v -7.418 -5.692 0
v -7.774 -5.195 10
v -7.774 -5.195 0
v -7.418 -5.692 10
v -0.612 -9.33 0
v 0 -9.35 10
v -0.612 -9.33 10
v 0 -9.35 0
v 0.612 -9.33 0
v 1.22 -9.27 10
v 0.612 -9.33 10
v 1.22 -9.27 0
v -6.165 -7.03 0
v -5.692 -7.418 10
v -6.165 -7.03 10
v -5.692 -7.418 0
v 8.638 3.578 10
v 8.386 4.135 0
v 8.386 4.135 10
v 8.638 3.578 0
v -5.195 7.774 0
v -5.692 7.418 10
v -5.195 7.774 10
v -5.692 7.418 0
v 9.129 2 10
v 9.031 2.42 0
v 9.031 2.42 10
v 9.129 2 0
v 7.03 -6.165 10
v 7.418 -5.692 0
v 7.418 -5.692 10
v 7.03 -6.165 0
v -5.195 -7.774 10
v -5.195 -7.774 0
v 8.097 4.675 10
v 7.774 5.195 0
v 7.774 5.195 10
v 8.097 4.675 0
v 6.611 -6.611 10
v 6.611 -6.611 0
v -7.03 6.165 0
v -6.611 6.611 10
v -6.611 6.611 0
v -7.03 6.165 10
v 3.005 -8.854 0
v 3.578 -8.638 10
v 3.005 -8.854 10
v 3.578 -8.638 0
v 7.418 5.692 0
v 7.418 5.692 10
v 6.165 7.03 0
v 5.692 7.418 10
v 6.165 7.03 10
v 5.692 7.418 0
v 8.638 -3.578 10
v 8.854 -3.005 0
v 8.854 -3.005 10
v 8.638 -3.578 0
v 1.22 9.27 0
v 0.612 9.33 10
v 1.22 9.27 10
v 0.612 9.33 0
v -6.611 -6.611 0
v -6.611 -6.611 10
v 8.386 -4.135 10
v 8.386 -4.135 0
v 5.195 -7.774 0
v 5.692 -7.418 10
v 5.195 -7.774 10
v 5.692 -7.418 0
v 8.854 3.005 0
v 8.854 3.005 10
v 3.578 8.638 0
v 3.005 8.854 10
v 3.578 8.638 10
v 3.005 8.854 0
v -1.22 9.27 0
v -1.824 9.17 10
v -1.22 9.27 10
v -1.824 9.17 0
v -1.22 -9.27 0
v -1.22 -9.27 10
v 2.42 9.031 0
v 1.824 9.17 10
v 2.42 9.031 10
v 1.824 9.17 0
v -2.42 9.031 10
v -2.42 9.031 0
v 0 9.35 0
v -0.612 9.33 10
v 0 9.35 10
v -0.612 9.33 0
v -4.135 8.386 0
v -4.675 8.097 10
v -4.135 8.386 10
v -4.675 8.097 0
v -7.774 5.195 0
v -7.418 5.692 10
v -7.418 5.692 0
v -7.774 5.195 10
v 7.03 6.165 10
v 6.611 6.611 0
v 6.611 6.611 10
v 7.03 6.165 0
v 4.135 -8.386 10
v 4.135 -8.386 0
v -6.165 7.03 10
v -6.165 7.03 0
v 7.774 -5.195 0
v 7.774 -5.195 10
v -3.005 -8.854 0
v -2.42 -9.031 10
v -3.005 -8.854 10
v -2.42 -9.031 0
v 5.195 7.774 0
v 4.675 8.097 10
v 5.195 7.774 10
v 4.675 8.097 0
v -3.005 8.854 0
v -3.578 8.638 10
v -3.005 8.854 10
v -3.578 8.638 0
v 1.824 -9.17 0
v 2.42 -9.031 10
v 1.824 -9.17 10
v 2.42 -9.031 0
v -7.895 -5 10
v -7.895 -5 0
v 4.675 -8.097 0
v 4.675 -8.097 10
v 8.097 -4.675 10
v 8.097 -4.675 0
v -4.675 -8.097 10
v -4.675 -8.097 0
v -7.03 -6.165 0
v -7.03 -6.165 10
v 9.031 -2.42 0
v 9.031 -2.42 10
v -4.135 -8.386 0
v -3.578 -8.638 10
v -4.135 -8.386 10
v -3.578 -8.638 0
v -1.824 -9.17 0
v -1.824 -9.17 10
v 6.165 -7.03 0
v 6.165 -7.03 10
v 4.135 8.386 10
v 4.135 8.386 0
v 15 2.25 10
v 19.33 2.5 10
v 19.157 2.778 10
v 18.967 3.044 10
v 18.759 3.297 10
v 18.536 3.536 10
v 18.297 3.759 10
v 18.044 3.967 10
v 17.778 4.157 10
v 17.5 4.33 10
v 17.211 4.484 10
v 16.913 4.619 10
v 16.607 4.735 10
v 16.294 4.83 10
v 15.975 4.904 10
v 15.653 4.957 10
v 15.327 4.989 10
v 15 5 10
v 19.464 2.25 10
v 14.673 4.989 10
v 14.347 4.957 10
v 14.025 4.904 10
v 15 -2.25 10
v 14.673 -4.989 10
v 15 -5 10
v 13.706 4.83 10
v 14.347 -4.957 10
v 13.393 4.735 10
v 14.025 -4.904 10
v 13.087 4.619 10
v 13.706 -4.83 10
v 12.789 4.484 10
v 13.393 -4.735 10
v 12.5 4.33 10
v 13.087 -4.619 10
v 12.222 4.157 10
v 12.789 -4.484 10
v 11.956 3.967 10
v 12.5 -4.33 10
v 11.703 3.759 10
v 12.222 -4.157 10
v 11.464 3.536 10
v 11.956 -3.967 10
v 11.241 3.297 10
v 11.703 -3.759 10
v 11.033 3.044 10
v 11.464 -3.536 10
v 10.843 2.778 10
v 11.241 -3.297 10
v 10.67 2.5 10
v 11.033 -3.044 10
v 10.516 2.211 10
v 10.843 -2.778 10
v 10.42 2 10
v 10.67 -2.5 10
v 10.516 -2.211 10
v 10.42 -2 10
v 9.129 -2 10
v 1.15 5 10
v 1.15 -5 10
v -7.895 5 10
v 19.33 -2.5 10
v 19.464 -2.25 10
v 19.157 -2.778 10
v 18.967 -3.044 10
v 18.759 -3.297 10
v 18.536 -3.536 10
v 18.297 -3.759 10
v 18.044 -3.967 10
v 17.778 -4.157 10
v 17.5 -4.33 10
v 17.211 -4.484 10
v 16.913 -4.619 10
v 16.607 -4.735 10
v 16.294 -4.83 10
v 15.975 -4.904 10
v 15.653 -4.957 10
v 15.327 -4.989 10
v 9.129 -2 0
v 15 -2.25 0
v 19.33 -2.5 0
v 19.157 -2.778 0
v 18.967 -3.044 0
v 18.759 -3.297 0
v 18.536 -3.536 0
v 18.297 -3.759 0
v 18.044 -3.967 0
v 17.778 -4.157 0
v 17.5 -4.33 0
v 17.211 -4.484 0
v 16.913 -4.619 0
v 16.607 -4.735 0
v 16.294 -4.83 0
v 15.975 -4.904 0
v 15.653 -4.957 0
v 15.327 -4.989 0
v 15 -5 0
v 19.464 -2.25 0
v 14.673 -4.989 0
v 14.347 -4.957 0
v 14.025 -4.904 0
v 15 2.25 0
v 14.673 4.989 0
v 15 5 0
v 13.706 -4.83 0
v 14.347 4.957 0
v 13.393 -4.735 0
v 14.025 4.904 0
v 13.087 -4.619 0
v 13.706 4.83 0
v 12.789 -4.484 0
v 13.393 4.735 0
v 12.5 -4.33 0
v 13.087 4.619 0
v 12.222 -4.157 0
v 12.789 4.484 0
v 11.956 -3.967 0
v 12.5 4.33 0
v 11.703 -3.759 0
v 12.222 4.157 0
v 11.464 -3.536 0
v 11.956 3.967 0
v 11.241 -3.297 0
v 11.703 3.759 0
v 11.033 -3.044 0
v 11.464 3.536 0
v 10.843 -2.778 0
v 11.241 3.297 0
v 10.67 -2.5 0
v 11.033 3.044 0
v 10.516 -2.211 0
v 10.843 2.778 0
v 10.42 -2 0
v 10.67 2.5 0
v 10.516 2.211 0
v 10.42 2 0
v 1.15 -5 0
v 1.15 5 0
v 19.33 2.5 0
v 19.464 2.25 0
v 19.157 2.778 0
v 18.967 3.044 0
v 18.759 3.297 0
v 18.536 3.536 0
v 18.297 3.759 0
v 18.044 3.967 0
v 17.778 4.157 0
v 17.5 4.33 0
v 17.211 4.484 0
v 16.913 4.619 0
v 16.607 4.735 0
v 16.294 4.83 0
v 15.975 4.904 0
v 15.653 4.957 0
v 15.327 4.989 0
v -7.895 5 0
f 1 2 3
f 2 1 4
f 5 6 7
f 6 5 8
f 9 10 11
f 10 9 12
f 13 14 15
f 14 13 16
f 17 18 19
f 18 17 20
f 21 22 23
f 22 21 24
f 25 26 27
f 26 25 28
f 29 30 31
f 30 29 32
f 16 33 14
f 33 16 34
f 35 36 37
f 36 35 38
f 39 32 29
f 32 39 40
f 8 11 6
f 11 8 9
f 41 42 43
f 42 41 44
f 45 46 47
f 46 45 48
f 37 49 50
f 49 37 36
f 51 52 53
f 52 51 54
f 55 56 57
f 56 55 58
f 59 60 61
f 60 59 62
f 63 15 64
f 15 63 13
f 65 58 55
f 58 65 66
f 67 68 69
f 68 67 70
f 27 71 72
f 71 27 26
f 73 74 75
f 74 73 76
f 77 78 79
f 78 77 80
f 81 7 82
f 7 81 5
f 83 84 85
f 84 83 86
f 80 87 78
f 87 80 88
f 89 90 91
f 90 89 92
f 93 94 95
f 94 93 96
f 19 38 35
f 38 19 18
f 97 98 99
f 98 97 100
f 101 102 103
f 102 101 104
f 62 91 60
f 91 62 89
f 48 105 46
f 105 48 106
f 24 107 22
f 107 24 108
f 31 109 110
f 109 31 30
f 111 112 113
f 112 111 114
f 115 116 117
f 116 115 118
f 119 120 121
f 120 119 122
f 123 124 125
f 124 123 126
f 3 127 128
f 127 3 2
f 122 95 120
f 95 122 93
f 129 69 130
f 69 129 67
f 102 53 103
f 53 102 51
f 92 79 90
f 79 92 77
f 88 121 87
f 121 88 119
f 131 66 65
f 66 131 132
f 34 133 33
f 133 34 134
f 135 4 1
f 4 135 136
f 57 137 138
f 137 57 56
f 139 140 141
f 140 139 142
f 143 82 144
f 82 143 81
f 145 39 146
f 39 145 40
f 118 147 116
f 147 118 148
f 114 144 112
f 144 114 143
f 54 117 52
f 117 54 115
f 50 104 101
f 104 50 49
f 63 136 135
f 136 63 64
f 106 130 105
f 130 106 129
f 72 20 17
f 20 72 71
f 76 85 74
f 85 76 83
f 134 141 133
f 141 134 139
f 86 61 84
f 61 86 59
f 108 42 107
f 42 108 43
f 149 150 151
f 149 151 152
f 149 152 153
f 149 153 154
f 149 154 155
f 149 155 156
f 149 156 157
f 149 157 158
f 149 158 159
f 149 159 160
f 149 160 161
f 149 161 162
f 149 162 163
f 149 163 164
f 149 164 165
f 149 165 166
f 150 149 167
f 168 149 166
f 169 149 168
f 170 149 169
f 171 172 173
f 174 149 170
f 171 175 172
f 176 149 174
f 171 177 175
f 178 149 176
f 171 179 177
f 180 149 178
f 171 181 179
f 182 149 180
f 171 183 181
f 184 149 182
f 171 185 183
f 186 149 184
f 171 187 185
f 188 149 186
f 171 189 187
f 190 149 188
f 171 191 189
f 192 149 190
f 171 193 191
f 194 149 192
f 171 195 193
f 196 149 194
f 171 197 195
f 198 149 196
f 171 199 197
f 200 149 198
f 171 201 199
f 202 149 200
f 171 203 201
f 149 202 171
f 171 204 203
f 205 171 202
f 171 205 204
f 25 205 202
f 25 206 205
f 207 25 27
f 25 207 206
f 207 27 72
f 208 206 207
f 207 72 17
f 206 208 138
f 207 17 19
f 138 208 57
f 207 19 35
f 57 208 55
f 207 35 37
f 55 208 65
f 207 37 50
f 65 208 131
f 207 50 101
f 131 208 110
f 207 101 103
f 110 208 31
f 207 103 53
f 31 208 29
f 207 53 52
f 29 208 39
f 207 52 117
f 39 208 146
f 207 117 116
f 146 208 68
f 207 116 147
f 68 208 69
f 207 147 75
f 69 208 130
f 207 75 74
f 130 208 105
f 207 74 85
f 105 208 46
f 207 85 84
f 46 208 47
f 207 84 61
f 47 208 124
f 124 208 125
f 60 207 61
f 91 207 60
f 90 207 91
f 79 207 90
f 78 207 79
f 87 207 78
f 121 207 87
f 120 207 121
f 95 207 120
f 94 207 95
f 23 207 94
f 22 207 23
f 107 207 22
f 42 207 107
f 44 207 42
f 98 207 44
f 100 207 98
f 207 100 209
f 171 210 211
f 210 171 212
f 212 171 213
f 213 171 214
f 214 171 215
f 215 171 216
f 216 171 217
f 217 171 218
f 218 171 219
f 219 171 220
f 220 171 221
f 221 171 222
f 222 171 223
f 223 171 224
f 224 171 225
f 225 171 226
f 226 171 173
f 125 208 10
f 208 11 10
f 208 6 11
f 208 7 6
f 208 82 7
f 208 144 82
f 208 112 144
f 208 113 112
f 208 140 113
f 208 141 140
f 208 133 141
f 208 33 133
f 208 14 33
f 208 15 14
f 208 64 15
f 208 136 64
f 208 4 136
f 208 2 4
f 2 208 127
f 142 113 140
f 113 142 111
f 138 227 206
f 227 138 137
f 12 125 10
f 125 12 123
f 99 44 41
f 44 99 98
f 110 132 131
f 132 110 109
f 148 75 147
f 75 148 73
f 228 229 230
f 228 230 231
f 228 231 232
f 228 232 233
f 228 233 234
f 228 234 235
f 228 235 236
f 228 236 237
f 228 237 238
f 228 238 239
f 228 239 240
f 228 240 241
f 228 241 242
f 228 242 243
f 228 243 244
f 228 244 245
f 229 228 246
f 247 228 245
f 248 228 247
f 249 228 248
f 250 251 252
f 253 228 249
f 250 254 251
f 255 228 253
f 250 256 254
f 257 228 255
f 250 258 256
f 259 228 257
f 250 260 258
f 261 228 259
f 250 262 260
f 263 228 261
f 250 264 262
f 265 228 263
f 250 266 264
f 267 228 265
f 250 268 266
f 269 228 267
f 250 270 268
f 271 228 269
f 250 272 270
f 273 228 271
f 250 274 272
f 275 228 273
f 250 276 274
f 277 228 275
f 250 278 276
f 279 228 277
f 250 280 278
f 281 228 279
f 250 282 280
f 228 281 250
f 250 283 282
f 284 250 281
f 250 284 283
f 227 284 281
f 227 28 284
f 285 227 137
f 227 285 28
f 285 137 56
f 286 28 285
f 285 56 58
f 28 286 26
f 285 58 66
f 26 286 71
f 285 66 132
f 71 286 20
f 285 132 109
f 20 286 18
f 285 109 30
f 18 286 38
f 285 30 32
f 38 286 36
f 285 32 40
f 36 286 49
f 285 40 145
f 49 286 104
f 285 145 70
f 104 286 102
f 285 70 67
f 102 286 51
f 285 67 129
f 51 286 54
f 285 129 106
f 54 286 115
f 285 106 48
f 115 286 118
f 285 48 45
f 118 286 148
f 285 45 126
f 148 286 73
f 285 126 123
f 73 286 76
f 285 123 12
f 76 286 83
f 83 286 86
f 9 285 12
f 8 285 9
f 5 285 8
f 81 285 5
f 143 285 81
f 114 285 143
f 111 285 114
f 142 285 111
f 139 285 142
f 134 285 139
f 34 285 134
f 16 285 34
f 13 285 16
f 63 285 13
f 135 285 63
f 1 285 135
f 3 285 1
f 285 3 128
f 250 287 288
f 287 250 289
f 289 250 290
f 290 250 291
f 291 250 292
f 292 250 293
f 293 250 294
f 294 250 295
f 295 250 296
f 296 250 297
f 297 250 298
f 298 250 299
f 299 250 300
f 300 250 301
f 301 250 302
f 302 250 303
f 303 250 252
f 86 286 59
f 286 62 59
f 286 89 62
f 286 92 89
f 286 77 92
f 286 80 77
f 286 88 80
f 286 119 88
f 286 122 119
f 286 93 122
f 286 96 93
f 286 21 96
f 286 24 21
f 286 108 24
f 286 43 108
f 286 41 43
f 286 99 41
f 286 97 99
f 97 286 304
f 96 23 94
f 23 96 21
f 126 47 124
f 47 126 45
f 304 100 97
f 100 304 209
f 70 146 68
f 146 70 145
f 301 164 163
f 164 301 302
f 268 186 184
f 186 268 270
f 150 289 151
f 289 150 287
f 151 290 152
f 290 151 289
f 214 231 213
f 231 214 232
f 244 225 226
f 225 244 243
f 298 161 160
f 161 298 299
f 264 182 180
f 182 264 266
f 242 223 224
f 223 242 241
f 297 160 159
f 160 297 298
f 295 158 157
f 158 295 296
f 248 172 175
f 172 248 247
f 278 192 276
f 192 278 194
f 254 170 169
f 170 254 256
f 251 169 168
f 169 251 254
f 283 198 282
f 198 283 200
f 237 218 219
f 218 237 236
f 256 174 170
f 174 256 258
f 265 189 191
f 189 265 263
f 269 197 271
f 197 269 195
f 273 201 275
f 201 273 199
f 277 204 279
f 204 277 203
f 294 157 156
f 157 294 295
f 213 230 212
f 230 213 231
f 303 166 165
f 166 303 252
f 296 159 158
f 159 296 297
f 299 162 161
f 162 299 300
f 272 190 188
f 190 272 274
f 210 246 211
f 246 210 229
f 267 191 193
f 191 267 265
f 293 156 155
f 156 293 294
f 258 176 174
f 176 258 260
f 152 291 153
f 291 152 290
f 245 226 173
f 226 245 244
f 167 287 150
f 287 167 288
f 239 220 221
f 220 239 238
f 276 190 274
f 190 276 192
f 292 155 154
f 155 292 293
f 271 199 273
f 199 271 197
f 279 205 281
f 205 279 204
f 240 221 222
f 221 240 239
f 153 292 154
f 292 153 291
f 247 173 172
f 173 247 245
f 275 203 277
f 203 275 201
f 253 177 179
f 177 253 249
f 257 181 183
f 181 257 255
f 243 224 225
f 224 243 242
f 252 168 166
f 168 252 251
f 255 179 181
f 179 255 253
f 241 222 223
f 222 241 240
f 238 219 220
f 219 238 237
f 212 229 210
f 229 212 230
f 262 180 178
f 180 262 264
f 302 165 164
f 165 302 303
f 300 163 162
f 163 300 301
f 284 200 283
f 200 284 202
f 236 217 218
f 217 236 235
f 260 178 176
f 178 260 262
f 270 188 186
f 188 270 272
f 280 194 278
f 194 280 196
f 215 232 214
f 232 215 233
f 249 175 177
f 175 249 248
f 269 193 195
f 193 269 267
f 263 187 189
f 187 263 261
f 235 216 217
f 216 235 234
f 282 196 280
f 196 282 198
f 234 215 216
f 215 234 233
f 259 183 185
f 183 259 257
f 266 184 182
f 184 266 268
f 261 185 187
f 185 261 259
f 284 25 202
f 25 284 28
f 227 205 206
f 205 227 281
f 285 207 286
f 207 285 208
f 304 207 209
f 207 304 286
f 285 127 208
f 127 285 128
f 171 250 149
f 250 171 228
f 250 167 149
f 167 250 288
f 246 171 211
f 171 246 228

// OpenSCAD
// Tubing organiser clip for a 12.7 mm lab stand rod
// Print orientation: flat on the bed, z = 0 up to z = 10

// ---------------- Parameters ----------------
ring_d      = 12.7;   // rod ring inner diameter (stand rod)
ring_w      = 3;      // rod ring wall thickness
ring_o      = ring_d + 2 * ring_w;  // rod ring outer diameter (18.7)

tub_d       = 6;      // tubing ring inner diameter
tub_w       = 2;      // tubing ring wall thickness
tub_x       = 15;     // tubing ring centre X position
tub_o       = tub_d + 2 * tub_w;    // tubing ring outer diameter (10)

bridge_x0   = 8;      // bridge start X
bridge_x1   = 12;     // bridge end X
bridge_w    = bridge_x1 - bridge_x0;  // bridge width (6)

cut_r       = 10;     // opening width for rod ring (-X side)
cut_t       = 4.5;    // opening width for tubing ring (+X side)

eps         = 0.5;    // cutter overshoot past faces
$fn         = 96;     // curve resolution

// ---------------- Model ----------------
difference() {
    union() {
        // Rod ring, centred at origin
        cylinder(d = ring_o, h = 10);

        // Tubing ring, centred at x = 15, y = 0
        translate([tub_x, 0, 0])
            cylinder(d = tub_o, h = 10);

        // Solid bridge between x = 8 and x = 12
        translate([bridge_x0, -bridge_w / 2, 0])
            cube([bridge_w, bridge_w, 10]);
    }

    // Opening in rod ring: x < 0 and -5 < y < 5
    translate([-ring_o / 2 - eps, -5, 0])
        cube([cut_r + 2 * eps, 10, 10 + eps]);

    // Opening in tubing ring: x > 15 and -2.25 < y < 2.25
    translate([tub_x, -cut_t / 2, 0])
        cube([tub_x - (-cut_t / 2) + eps, cut_t, 10 + eps]);
}
